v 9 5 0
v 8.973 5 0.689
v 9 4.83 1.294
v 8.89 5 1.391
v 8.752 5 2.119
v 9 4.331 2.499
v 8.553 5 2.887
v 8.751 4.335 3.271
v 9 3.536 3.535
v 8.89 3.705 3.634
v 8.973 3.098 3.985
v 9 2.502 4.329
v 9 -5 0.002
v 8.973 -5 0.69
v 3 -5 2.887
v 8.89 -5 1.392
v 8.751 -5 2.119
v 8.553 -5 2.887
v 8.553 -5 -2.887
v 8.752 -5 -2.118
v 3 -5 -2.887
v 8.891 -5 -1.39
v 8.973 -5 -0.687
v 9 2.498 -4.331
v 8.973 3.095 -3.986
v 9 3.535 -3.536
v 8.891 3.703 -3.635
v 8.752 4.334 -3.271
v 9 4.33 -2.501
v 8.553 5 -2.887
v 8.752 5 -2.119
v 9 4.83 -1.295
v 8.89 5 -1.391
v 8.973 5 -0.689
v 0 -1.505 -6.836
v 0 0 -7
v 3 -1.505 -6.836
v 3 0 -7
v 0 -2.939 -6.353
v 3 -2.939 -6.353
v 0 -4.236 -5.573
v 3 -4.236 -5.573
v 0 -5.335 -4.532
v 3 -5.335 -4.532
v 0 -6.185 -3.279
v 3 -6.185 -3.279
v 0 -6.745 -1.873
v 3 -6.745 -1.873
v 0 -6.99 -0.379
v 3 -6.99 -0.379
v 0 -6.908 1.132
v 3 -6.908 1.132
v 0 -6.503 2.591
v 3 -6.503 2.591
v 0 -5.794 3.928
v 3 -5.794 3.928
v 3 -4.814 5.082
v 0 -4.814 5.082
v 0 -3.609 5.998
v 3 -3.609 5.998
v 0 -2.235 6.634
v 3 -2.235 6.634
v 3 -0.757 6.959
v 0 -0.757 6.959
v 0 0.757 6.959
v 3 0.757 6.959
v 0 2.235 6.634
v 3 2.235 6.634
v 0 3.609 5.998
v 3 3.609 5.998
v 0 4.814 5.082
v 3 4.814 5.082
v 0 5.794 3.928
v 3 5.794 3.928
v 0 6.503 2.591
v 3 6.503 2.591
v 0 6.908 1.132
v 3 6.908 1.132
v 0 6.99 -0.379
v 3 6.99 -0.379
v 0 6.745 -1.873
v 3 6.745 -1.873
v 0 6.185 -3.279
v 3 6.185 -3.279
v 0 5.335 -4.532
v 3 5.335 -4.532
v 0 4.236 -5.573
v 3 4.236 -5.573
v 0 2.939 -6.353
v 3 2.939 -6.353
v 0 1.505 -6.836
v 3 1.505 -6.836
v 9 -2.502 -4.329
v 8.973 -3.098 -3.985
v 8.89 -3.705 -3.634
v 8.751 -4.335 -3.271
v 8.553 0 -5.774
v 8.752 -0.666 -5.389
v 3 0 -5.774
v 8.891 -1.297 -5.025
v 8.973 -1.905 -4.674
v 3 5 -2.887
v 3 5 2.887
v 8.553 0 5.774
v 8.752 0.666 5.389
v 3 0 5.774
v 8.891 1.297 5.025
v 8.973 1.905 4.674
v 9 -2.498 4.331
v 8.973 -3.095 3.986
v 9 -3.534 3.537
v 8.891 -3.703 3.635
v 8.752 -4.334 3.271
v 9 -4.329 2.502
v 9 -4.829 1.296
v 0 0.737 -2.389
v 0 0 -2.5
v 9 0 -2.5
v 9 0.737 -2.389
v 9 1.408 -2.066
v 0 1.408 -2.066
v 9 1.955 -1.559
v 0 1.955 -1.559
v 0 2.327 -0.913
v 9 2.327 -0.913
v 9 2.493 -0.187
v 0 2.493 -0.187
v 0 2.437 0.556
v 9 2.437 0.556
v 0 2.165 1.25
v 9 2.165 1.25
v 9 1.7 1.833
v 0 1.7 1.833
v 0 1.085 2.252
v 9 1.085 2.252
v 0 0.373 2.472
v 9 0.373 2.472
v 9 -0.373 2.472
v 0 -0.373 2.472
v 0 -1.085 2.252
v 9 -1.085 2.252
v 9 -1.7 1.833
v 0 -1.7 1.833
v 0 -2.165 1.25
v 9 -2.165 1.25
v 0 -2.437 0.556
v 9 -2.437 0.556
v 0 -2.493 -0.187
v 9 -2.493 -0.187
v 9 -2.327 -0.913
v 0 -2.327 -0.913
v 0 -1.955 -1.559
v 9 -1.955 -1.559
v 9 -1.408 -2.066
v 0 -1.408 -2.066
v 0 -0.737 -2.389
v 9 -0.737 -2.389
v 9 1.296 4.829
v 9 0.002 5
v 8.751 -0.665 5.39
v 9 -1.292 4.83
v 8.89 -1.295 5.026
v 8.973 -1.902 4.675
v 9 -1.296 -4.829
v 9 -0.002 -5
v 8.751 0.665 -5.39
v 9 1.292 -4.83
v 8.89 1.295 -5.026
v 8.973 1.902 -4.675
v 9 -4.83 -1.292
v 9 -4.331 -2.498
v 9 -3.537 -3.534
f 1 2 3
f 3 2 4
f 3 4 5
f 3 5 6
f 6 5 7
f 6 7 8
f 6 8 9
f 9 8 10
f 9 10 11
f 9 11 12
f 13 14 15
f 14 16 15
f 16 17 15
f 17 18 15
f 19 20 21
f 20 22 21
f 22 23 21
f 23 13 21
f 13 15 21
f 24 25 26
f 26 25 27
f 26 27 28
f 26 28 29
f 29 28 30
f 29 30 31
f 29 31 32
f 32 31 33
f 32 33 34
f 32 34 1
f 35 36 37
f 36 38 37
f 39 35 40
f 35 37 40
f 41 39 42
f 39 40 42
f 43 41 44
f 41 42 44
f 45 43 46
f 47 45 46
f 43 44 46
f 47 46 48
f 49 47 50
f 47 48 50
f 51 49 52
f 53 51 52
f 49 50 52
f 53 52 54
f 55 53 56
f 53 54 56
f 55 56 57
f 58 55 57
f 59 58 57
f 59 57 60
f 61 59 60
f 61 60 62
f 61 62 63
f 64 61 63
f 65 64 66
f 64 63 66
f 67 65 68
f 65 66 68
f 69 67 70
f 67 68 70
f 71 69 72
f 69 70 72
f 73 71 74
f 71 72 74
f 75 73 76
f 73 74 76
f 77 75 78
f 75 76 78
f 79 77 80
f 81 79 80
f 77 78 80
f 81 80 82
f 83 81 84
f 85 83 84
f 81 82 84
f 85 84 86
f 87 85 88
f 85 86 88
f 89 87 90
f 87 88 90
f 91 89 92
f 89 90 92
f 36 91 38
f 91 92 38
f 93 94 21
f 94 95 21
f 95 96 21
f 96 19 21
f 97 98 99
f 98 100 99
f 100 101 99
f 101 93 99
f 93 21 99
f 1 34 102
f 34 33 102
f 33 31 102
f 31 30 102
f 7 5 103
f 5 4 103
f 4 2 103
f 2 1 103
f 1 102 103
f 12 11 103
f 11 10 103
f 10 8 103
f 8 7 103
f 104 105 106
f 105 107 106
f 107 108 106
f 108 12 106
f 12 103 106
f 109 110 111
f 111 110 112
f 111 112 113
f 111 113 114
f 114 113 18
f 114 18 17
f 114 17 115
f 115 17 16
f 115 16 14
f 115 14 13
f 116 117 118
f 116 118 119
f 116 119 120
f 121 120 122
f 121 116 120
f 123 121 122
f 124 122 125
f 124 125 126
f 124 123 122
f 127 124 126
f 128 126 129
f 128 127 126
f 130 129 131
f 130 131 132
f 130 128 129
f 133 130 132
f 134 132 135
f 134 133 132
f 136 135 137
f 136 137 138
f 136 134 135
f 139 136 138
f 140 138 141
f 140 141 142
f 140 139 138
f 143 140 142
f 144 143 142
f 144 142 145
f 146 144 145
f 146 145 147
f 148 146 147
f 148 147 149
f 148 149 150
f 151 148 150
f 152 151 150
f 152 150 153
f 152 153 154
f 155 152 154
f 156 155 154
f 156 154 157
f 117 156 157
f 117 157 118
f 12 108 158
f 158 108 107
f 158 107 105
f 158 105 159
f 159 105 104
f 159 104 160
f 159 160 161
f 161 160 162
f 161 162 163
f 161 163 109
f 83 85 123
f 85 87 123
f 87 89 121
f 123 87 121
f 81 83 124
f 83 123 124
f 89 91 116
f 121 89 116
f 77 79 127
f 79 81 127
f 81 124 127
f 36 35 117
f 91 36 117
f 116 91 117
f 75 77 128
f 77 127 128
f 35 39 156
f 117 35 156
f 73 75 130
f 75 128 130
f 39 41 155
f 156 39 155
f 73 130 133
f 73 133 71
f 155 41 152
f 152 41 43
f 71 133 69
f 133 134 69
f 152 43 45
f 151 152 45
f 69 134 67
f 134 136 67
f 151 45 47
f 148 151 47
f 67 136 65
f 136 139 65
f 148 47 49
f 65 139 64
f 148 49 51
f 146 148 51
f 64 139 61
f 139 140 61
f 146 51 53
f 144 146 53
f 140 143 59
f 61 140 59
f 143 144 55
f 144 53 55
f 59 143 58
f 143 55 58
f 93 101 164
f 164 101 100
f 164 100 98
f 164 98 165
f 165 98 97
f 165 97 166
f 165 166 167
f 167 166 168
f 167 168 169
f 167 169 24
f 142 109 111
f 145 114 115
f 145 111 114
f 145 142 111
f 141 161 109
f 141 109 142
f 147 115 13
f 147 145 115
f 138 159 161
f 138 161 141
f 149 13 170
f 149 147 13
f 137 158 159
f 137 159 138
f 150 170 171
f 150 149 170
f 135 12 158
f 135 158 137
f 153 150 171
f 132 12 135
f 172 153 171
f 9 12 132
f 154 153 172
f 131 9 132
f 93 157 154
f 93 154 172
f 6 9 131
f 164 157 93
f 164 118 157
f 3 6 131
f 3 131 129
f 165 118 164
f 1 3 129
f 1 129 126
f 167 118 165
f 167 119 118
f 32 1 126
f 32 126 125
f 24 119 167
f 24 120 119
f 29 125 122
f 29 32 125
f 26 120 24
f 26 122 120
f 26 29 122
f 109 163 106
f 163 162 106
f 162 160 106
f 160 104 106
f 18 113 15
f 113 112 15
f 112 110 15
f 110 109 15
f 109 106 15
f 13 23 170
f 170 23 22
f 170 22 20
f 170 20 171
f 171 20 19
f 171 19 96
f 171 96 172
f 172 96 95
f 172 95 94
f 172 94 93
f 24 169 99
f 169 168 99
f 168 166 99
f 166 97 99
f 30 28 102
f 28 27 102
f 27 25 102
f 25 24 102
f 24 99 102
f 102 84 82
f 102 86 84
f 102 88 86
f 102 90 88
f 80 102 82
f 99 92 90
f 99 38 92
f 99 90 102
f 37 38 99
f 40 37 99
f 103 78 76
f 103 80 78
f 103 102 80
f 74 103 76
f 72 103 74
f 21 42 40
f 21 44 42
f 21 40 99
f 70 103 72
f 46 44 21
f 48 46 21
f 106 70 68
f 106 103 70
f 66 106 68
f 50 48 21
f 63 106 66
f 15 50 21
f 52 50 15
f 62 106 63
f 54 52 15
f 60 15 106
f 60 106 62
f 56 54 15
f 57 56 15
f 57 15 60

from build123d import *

# Parameters (mm, degrees)
SKETCH1_R      = 2.5
EXTRUDE1_DEPTH = 9
SKETCH3_W      = 3
SKETCH3_H      = 4.5


# Read off the part's stored shape, not the designer's step: Cut-Extrude1
with BuildPart() as part:
    # Sketch1 → Extrude1 (new body)
    with BuildSketch(Plane(origin=(0, 0, 0), x_dir=(0, 0, -1), z_dir=(1, 0, 0))):
        Polygon((5.773502692, 0), (2.886751346, 5), (-2.886751346, 5), (-5.773502692, 0), (-2.886751346, -5), (2.886751346, -5), align=None)
        Circle(SKETCH1_R, mode=Mode.SUBTRACT)
    extrude(amount=EXTRUDE1_DEPTH)

    # Cut-Extrude1 outline → Cut-Extrude1 (revolve, cut)
    with BuildSketch(Plane.YX):
        Polygon((5.773502692, 9.000000845), (4.99999886, 9.000000845), (5.773502688, 8.553418015), align=None)
    revolve(axis=Axis((0, 0, 0), (1, 0, 0)), mode=Mode.SUBTRACT)

    # Sketch3 → Revolve1 (revolve)
    with BuildSketch(Plane.XY, mode=Mode.PRIVATE) as revolve1_sk:
        with Locations((1.5, 4.75)):
            Rectangle(SKETCH3_W, SKETCH3_H)
    revolve(revolve1_sk.sketch.rotate(Axis((0, 0, 0), (-1, 0, 0)), 90), axis=Axis((0, 0, 0), (-1, 0, 0)))


solid = part.part
